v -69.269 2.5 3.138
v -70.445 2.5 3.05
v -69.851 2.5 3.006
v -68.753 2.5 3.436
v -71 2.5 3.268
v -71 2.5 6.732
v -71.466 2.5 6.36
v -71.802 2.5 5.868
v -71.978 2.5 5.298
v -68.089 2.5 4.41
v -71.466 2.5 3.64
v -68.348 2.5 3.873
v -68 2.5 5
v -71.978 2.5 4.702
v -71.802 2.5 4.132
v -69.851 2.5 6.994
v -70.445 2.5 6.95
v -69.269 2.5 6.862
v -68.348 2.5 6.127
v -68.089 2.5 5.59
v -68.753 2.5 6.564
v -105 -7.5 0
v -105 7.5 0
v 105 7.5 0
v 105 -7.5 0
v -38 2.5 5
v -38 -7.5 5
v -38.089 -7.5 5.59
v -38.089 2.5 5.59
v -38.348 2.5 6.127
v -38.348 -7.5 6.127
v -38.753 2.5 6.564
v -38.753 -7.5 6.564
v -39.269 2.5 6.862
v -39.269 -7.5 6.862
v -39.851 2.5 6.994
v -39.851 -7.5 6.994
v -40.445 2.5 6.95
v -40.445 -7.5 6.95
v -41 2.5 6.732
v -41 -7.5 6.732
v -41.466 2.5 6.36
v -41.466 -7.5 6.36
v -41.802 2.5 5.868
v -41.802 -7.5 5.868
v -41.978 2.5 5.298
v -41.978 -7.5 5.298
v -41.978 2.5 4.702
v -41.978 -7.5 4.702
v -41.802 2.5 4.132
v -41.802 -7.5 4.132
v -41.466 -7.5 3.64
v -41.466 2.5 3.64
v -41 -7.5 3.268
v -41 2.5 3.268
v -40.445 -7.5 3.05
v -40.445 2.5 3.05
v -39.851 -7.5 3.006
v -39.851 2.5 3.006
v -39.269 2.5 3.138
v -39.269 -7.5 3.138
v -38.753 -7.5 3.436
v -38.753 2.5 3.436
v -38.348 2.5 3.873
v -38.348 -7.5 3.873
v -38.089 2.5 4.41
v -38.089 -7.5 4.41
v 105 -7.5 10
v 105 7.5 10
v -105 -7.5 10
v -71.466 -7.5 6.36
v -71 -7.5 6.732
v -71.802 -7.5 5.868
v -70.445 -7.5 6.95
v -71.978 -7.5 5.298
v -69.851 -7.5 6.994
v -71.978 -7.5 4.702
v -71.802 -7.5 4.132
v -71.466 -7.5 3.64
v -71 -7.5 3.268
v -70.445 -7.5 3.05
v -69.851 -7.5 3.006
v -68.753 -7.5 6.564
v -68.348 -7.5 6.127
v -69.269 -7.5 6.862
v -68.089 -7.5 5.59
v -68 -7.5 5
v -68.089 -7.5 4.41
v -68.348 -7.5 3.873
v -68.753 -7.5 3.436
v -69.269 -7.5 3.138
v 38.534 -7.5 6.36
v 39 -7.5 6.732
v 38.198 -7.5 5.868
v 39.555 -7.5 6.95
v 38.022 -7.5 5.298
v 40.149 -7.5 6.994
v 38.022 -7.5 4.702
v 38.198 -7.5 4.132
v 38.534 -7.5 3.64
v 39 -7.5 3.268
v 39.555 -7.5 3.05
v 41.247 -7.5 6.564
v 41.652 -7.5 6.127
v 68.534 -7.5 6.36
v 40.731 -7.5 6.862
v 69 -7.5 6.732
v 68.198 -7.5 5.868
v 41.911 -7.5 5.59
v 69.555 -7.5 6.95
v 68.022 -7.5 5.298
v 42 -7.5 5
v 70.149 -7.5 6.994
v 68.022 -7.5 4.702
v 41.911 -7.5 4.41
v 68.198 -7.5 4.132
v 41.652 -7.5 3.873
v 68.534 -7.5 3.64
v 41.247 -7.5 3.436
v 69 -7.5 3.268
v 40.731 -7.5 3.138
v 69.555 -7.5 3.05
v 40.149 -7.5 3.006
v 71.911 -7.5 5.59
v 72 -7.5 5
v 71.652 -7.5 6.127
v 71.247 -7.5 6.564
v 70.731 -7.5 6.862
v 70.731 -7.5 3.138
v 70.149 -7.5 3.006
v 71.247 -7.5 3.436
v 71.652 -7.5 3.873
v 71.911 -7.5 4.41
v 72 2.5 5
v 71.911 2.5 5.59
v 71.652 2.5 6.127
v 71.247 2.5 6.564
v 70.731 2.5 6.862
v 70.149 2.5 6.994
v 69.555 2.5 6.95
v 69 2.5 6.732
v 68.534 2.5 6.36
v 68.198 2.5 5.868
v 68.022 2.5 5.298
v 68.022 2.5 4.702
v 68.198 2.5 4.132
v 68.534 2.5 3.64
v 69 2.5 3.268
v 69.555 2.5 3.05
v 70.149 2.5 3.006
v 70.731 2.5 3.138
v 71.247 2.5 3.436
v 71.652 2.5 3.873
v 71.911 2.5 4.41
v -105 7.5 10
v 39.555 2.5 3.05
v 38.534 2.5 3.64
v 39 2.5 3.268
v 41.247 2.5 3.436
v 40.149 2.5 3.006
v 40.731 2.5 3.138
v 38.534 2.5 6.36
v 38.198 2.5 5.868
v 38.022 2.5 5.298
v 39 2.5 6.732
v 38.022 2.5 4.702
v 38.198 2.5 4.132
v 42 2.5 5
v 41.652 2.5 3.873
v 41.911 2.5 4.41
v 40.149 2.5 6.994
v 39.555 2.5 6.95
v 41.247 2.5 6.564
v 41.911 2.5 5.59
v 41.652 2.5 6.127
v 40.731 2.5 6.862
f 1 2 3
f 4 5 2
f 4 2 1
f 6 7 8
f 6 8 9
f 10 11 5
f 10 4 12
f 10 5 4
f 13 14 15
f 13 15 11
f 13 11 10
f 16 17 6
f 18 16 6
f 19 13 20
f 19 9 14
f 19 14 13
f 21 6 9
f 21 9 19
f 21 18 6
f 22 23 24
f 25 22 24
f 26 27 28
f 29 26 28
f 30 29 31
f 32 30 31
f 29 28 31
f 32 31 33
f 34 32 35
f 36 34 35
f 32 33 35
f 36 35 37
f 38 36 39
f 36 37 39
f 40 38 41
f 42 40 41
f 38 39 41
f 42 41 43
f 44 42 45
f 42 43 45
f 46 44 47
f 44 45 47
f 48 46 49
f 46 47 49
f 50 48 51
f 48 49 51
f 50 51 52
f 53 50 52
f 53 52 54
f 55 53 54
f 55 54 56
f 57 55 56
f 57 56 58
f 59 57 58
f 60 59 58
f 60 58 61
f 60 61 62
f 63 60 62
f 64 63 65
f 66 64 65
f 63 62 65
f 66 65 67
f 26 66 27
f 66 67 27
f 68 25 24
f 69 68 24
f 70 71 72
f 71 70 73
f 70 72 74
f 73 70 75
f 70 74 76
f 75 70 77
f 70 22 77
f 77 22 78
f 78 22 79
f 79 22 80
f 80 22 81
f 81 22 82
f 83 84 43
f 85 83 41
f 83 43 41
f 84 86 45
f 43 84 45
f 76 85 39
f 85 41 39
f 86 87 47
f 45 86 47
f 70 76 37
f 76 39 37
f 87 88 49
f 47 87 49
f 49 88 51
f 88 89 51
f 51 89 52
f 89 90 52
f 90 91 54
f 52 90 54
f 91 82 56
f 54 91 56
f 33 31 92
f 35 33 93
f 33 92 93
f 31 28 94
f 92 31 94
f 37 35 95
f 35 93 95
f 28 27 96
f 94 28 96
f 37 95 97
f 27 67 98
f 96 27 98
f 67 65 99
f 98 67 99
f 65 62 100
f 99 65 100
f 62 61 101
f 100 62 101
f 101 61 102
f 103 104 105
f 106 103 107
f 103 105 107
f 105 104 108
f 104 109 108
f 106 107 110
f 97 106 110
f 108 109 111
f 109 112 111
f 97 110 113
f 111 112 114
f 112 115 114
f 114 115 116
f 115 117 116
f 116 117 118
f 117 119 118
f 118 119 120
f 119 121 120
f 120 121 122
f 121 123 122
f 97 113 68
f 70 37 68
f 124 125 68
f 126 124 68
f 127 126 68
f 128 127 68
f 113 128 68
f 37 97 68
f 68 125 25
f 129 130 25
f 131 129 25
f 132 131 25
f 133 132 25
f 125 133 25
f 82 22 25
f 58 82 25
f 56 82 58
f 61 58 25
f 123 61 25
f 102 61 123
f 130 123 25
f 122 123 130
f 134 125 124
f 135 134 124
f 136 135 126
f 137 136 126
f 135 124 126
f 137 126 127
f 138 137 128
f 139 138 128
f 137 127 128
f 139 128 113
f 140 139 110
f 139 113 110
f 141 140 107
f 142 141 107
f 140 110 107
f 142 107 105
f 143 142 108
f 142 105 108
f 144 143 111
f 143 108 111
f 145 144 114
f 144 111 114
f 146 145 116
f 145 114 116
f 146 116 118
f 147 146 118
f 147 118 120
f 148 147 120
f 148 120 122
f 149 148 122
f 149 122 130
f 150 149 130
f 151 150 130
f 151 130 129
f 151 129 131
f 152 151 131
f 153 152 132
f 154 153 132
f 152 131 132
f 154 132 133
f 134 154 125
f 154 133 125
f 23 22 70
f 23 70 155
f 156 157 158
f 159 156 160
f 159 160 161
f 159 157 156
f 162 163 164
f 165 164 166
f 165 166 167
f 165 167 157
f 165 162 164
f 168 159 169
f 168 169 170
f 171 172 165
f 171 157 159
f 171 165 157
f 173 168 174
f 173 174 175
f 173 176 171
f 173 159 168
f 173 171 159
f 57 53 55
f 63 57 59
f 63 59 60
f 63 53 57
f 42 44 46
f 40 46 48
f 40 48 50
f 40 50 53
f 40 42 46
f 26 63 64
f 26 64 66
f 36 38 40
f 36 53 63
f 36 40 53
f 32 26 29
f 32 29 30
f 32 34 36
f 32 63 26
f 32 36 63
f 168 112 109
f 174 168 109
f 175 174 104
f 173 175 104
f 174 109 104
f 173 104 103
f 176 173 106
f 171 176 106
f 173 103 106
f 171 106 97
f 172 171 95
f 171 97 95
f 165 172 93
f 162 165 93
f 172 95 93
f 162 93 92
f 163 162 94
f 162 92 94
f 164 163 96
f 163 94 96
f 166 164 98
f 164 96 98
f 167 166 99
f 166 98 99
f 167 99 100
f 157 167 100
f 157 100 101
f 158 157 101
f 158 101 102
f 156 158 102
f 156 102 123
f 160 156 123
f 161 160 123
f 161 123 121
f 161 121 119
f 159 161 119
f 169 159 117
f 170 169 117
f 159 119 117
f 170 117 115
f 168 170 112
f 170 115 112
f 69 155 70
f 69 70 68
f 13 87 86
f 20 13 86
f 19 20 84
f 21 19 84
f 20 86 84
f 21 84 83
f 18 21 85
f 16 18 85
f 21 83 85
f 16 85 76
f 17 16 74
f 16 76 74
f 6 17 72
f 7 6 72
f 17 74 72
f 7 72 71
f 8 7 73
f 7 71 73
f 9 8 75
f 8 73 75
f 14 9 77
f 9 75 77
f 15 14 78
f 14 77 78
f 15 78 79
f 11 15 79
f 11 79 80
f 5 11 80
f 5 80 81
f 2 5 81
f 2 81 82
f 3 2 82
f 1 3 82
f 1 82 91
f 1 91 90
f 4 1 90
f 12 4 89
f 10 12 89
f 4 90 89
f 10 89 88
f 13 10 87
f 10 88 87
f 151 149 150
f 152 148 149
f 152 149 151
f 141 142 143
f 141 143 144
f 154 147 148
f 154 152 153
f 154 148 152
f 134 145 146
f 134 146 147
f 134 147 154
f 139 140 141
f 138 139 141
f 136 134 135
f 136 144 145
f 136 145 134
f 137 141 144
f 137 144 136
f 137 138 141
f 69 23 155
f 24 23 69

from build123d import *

# Parameters (mm, degrees)
F0_W     = 210
F0_H     = 15
F1_DEPTH = 10
F3_DEPTH = 10


with BuildPart() as f1:
    # F0 (on Top) → F1 (new body)
    with BuildSketch(Plane.XY):
        Rectangle(F0_W, F0_H)
    extrude(amount=F1_DEPTH)

    # F2 (on face) → F3 (cut)
    with BuildSketch(Plane.XZ.offset(7.5)):
        with BuildLine():
            ThreePointArc((68, 5), (70, 3), (72, 5))
            Line((72, 5), (68, 5))
        make_face()
        with BuildLine():
            Line((68, 5), (72, 5))
            ThreePointArc((72, 5), (70, 7), (68, 5))
        make_face()
        with BuildLine():
            ThreePointArc((-72, 5), (-70, 3), (-68, 5))
            Line((-68, 5), (-72, 5))
        make_face()
        with BuildLine():
            Line((-72, 5), (-68, 5))
            ThreePointArc((-68, 5), (-70, 7), (-72, 5))
        make_face()
        with BuildLine():
            ThreePointArc((-42, 5), (-40, 3), (-38, 5))
            Line((-38, 5), (-42, 5))
        make_face()
        with BuildLine():
            Line((-42, 5), (-38, 5))
            ThreePointArc((-38, 5), (-40, 7), (-42, 5))
        make_face()
        with BuildLine():
            ThreePointArc((38, 5), (40, 3), (42, 5))
            Line((42, 5), (38, 5))
        make_face()
        with BuildLine():
            Line((38, 5), (42, 5))
            ThreePointArc((42, 5), (40, 7), (38, 5))
        make_face()
    extrude(amount=-F3_DEPTH, mode=Mode.SUBTRACT)


solid = f1.part
